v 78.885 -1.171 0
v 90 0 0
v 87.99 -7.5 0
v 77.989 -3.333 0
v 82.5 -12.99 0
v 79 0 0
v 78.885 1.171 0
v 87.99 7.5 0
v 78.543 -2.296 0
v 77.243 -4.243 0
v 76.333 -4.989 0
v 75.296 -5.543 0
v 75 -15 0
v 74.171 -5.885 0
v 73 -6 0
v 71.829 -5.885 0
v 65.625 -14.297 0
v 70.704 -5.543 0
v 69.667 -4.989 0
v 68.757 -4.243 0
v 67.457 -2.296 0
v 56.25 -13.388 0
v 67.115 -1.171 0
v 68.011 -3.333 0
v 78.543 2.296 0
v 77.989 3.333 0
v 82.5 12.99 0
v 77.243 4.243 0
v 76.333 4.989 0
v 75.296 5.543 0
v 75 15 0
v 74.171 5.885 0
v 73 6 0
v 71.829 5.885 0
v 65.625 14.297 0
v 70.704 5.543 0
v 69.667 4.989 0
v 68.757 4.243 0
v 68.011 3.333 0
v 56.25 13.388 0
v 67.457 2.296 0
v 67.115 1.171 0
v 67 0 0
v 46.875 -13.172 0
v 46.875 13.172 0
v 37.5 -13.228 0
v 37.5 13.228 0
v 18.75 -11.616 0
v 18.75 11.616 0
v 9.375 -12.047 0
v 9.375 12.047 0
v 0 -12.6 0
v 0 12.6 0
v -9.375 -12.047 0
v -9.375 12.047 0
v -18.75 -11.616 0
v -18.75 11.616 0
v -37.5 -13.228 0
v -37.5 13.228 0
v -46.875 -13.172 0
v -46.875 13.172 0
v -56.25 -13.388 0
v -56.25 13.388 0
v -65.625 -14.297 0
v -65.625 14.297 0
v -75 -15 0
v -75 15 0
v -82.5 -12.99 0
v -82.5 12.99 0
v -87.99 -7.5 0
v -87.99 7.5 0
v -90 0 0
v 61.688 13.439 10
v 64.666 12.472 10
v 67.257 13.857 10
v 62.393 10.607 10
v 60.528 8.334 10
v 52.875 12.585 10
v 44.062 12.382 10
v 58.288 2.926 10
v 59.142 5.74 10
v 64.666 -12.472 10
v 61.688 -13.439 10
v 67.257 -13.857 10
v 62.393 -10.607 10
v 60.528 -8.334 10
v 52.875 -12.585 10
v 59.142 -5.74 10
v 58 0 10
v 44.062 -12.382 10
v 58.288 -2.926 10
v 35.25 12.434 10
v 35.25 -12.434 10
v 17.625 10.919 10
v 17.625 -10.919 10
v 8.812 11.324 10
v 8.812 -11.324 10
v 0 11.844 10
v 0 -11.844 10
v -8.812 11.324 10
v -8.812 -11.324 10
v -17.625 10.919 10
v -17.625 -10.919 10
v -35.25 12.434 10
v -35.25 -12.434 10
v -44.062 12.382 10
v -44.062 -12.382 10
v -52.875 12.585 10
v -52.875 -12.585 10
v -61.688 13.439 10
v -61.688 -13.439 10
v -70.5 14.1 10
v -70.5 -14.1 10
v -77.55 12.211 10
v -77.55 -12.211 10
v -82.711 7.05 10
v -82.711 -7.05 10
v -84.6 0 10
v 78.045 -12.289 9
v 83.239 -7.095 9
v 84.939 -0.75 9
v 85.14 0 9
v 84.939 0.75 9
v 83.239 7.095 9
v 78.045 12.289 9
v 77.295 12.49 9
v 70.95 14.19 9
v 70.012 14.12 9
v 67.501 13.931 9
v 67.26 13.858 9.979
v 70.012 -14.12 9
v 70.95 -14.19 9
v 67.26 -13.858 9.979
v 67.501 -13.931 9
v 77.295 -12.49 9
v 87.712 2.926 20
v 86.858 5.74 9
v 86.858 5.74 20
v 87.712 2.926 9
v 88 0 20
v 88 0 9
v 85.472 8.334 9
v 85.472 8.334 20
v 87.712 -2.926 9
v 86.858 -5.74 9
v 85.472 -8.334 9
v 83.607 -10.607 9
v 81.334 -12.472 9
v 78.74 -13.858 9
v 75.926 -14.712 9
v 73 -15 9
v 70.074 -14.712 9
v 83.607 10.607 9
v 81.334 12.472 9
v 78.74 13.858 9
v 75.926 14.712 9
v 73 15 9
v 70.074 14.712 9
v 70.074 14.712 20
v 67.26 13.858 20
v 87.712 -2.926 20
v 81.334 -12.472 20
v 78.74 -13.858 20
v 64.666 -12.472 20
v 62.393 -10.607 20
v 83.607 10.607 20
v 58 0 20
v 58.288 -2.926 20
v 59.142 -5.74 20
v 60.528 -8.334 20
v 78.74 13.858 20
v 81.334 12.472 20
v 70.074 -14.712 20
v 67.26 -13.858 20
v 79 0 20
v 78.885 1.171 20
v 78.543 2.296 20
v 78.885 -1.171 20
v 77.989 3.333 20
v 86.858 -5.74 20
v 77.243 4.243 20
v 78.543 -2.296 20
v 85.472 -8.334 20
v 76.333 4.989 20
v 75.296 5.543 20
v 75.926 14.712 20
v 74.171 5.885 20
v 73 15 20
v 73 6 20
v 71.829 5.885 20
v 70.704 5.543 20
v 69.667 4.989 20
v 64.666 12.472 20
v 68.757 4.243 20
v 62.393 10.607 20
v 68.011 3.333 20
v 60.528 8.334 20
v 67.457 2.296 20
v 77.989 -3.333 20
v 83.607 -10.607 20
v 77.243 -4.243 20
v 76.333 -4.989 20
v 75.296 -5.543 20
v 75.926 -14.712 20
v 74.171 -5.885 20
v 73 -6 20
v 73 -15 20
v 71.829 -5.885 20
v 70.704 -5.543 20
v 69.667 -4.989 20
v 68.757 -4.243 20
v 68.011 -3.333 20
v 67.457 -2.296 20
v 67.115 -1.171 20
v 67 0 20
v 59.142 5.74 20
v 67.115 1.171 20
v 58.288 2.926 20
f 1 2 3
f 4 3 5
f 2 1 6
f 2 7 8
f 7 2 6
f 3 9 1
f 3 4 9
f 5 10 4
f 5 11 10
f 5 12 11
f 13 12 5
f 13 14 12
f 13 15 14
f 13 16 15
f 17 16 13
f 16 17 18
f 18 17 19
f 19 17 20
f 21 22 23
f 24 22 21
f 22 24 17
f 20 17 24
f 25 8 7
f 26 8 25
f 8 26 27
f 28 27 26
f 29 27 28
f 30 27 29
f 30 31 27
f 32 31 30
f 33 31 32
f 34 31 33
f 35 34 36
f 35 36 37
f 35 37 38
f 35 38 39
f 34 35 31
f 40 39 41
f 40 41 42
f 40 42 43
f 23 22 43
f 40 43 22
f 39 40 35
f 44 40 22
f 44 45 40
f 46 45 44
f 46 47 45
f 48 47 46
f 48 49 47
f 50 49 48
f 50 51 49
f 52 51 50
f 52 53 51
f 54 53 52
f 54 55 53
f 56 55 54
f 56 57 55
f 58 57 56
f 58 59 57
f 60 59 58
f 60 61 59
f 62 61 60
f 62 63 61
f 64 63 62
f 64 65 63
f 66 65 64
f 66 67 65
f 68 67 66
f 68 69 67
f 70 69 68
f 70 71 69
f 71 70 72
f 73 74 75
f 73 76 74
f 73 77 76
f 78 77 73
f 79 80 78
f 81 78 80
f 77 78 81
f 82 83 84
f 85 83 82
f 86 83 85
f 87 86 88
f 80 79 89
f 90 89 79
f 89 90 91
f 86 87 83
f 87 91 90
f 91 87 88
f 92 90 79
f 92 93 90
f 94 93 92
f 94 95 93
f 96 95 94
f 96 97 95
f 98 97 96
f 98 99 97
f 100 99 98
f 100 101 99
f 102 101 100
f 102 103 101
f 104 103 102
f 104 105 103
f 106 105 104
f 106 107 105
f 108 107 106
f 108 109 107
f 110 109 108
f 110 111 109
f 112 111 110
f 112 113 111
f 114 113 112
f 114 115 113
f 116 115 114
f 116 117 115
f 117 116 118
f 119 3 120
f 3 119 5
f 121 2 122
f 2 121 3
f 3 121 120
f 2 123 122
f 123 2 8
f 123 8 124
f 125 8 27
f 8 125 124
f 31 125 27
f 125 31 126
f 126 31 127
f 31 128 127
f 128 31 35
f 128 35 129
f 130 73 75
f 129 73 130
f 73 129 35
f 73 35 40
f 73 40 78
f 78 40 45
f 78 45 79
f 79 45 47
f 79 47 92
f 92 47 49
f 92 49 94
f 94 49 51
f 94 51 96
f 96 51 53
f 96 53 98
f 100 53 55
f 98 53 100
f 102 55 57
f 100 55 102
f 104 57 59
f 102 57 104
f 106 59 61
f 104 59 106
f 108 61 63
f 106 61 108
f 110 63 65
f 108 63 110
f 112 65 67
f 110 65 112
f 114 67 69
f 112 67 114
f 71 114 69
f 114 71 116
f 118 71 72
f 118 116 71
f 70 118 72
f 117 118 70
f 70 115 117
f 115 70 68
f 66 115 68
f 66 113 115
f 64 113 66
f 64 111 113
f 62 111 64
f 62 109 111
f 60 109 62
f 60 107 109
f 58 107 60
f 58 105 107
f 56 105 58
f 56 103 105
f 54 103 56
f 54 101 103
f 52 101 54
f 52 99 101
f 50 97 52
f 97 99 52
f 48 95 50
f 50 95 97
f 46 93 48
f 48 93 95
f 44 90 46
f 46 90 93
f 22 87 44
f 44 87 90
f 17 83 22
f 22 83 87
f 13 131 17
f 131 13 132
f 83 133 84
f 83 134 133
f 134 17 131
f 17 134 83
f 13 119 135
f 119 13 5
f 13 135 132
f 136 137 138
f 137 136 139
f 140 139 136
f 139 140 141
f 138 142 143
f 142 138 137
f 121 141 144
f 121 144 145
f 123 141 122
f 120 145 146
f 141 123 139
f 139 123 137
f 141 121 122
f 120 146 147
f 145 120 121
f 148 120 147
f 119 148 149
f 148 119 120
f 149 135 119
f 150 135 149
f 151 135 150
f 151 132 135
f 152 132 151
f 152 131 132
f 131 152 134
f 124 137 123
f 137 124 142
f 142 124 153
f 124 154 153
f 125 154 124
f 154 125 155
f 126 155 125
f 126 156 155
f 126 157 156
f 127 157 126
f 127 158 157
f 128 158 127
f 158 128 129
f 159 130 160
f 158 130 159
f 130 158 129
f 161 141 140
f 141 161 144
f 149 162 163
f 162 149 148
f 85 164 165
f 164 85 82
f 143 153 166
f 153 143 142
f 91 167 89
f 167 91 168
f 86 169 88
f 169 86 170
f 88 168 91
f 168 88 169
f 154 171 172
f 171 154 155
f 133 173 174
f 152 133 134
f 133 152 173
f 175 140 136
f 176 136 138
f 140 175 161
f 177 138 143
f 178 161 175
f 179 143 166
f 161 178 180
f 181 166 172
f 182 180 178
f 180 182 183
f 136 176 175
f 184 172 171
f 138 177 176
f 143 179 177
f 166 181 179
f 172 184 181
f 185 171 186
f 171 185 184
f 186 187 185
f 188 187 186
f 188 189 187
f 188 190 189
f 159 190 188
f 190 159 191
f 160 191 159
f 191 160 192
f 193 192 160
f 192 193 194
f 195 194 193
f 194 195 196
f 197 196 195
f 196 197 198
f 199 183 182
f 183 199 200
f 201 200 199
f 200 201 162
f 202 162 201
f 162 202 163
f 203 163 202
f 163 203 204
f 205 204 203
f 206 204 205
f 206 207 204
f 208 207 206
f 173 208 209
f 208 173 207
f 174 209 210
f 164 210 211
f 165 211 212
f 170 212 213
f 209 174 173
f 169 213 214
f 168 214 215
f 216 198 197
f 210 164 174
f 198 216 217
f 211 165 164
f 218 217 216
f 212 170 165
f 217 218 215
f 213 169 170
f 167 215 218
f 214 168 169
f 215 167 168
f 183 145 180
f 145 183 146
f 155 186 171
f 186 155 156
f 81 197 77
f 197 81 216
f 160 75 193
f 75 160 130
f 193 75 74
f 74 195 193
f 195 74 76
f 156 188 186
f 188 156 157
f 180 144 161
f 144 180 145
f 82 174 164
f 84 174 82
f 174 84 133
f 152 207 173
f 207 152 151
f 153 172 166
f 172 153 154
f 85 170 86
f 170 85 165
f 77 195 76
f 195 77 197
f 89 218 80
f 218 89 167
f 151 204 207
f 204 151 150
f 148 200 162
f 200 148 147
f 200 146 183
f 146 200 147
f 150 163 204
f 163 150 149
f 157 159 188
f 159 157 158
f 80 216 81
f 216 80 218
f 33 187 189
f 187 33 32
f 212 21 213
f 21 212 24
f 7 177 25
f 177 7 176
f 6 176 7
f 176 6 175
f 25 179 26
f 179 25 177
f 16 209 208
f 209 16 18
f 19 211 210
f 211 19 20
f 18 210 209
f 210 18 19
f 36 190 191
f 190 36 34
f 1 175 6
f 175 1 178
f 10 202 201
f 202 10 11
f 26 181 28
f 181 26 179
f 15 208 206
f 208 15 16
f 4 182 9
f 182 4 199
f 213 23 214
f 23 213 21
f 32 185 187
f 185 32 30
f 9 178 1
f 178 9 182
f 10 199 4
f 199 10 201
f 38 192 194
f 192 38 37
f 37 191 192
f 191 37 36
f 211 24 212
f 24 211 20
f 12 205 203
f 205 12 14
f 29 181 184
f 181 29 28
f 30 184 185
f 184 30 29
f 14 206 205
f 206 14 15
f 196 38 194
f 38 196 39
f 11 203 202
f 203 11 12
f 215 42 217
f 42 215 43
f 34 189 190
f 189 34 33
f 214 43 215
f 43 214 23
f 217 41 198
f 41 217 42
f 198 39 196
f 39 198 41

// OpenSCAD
$fn = 32;

// ----------------------------------------------------------------------
// Handle: 180 x 30 mm grip, 10 mm thick
// ----------------------------------------------------------------------

// --- parameters (mm) ---
length = 180;             // grip length
width = 30;               // grip width
thickness = 10;           // grip thickness
waist = 0.8;              // width factor at the middle
draft = 0.94;             // top face scale of the extrusion
scallops = 4;             // finger rests per side
ripple = 0.05;            // depth factor of the finger rests
boss_d = 30;              // mounting boss diameter
boss_h = 10;              // mounting boss height
boss_hole_d = 12;         // screw clearance through the boss
boss_r = 73;              // boss centre from the grip centre

/* ergonomic grip outline, closed spline-like polygon in the XY plane */
grip = [[-75, 15], [-65.625, 14.297], [-56.25, 13.388], [-46.875, 13.172], [-37.5, 13.228], [-28.125, 12.422], [-18.75, 11.616], [-9.375, 12.047], [0, 12.6], [9.375, 12.047], [18.75, 11.616], [28.125, 12.422], [37.5, 13.228], [46.875, 13.172], [56.25, 13.388], [65.625, 14.297], [75, 15], [82.5, 12.99], [87.99, 7.5], [90, 0], [87.99, -7.5], [82.5, -12.99], [75, -15], [75, -15], [65.625, -14.297], [56.25, -13.388], [46.875, -13.172], [37.5, -13.228], [28.125, -12.422], [18.75, -11.616], [9.375, -12.047], [0, -12.6], [-9.375, -12.047], [-18.75, -11.616], [-28.125, -12.422], [-37.5, -13.228], [-46.875, -13.172], [-56.25, -13.388], [-65.625, -14.297], [-75, -15], [-82.5, -12.99], [-87.99, -7.5], [-90, 0], [-87.99, 7.5], [-82.5, 12.99], [-75, 15]];

module grip_body() {
  linear_extrude(height = thickness, scale = draft) polygon(grip);
}

module boss_body() {
  /* sunk 1 mm into the grip so the joint overlaps */
  translate([boss_r, 0, thickness - 1]) cylinder(h = boss_h + 1, d = boss_d);
}

difference() {
  union() {
    grip_body();
    boss_body();
  }
  translate([boss_r, 0, -1]) cylinder(h = thickness + boss_h + 2, d = boss_hole_d);
}
